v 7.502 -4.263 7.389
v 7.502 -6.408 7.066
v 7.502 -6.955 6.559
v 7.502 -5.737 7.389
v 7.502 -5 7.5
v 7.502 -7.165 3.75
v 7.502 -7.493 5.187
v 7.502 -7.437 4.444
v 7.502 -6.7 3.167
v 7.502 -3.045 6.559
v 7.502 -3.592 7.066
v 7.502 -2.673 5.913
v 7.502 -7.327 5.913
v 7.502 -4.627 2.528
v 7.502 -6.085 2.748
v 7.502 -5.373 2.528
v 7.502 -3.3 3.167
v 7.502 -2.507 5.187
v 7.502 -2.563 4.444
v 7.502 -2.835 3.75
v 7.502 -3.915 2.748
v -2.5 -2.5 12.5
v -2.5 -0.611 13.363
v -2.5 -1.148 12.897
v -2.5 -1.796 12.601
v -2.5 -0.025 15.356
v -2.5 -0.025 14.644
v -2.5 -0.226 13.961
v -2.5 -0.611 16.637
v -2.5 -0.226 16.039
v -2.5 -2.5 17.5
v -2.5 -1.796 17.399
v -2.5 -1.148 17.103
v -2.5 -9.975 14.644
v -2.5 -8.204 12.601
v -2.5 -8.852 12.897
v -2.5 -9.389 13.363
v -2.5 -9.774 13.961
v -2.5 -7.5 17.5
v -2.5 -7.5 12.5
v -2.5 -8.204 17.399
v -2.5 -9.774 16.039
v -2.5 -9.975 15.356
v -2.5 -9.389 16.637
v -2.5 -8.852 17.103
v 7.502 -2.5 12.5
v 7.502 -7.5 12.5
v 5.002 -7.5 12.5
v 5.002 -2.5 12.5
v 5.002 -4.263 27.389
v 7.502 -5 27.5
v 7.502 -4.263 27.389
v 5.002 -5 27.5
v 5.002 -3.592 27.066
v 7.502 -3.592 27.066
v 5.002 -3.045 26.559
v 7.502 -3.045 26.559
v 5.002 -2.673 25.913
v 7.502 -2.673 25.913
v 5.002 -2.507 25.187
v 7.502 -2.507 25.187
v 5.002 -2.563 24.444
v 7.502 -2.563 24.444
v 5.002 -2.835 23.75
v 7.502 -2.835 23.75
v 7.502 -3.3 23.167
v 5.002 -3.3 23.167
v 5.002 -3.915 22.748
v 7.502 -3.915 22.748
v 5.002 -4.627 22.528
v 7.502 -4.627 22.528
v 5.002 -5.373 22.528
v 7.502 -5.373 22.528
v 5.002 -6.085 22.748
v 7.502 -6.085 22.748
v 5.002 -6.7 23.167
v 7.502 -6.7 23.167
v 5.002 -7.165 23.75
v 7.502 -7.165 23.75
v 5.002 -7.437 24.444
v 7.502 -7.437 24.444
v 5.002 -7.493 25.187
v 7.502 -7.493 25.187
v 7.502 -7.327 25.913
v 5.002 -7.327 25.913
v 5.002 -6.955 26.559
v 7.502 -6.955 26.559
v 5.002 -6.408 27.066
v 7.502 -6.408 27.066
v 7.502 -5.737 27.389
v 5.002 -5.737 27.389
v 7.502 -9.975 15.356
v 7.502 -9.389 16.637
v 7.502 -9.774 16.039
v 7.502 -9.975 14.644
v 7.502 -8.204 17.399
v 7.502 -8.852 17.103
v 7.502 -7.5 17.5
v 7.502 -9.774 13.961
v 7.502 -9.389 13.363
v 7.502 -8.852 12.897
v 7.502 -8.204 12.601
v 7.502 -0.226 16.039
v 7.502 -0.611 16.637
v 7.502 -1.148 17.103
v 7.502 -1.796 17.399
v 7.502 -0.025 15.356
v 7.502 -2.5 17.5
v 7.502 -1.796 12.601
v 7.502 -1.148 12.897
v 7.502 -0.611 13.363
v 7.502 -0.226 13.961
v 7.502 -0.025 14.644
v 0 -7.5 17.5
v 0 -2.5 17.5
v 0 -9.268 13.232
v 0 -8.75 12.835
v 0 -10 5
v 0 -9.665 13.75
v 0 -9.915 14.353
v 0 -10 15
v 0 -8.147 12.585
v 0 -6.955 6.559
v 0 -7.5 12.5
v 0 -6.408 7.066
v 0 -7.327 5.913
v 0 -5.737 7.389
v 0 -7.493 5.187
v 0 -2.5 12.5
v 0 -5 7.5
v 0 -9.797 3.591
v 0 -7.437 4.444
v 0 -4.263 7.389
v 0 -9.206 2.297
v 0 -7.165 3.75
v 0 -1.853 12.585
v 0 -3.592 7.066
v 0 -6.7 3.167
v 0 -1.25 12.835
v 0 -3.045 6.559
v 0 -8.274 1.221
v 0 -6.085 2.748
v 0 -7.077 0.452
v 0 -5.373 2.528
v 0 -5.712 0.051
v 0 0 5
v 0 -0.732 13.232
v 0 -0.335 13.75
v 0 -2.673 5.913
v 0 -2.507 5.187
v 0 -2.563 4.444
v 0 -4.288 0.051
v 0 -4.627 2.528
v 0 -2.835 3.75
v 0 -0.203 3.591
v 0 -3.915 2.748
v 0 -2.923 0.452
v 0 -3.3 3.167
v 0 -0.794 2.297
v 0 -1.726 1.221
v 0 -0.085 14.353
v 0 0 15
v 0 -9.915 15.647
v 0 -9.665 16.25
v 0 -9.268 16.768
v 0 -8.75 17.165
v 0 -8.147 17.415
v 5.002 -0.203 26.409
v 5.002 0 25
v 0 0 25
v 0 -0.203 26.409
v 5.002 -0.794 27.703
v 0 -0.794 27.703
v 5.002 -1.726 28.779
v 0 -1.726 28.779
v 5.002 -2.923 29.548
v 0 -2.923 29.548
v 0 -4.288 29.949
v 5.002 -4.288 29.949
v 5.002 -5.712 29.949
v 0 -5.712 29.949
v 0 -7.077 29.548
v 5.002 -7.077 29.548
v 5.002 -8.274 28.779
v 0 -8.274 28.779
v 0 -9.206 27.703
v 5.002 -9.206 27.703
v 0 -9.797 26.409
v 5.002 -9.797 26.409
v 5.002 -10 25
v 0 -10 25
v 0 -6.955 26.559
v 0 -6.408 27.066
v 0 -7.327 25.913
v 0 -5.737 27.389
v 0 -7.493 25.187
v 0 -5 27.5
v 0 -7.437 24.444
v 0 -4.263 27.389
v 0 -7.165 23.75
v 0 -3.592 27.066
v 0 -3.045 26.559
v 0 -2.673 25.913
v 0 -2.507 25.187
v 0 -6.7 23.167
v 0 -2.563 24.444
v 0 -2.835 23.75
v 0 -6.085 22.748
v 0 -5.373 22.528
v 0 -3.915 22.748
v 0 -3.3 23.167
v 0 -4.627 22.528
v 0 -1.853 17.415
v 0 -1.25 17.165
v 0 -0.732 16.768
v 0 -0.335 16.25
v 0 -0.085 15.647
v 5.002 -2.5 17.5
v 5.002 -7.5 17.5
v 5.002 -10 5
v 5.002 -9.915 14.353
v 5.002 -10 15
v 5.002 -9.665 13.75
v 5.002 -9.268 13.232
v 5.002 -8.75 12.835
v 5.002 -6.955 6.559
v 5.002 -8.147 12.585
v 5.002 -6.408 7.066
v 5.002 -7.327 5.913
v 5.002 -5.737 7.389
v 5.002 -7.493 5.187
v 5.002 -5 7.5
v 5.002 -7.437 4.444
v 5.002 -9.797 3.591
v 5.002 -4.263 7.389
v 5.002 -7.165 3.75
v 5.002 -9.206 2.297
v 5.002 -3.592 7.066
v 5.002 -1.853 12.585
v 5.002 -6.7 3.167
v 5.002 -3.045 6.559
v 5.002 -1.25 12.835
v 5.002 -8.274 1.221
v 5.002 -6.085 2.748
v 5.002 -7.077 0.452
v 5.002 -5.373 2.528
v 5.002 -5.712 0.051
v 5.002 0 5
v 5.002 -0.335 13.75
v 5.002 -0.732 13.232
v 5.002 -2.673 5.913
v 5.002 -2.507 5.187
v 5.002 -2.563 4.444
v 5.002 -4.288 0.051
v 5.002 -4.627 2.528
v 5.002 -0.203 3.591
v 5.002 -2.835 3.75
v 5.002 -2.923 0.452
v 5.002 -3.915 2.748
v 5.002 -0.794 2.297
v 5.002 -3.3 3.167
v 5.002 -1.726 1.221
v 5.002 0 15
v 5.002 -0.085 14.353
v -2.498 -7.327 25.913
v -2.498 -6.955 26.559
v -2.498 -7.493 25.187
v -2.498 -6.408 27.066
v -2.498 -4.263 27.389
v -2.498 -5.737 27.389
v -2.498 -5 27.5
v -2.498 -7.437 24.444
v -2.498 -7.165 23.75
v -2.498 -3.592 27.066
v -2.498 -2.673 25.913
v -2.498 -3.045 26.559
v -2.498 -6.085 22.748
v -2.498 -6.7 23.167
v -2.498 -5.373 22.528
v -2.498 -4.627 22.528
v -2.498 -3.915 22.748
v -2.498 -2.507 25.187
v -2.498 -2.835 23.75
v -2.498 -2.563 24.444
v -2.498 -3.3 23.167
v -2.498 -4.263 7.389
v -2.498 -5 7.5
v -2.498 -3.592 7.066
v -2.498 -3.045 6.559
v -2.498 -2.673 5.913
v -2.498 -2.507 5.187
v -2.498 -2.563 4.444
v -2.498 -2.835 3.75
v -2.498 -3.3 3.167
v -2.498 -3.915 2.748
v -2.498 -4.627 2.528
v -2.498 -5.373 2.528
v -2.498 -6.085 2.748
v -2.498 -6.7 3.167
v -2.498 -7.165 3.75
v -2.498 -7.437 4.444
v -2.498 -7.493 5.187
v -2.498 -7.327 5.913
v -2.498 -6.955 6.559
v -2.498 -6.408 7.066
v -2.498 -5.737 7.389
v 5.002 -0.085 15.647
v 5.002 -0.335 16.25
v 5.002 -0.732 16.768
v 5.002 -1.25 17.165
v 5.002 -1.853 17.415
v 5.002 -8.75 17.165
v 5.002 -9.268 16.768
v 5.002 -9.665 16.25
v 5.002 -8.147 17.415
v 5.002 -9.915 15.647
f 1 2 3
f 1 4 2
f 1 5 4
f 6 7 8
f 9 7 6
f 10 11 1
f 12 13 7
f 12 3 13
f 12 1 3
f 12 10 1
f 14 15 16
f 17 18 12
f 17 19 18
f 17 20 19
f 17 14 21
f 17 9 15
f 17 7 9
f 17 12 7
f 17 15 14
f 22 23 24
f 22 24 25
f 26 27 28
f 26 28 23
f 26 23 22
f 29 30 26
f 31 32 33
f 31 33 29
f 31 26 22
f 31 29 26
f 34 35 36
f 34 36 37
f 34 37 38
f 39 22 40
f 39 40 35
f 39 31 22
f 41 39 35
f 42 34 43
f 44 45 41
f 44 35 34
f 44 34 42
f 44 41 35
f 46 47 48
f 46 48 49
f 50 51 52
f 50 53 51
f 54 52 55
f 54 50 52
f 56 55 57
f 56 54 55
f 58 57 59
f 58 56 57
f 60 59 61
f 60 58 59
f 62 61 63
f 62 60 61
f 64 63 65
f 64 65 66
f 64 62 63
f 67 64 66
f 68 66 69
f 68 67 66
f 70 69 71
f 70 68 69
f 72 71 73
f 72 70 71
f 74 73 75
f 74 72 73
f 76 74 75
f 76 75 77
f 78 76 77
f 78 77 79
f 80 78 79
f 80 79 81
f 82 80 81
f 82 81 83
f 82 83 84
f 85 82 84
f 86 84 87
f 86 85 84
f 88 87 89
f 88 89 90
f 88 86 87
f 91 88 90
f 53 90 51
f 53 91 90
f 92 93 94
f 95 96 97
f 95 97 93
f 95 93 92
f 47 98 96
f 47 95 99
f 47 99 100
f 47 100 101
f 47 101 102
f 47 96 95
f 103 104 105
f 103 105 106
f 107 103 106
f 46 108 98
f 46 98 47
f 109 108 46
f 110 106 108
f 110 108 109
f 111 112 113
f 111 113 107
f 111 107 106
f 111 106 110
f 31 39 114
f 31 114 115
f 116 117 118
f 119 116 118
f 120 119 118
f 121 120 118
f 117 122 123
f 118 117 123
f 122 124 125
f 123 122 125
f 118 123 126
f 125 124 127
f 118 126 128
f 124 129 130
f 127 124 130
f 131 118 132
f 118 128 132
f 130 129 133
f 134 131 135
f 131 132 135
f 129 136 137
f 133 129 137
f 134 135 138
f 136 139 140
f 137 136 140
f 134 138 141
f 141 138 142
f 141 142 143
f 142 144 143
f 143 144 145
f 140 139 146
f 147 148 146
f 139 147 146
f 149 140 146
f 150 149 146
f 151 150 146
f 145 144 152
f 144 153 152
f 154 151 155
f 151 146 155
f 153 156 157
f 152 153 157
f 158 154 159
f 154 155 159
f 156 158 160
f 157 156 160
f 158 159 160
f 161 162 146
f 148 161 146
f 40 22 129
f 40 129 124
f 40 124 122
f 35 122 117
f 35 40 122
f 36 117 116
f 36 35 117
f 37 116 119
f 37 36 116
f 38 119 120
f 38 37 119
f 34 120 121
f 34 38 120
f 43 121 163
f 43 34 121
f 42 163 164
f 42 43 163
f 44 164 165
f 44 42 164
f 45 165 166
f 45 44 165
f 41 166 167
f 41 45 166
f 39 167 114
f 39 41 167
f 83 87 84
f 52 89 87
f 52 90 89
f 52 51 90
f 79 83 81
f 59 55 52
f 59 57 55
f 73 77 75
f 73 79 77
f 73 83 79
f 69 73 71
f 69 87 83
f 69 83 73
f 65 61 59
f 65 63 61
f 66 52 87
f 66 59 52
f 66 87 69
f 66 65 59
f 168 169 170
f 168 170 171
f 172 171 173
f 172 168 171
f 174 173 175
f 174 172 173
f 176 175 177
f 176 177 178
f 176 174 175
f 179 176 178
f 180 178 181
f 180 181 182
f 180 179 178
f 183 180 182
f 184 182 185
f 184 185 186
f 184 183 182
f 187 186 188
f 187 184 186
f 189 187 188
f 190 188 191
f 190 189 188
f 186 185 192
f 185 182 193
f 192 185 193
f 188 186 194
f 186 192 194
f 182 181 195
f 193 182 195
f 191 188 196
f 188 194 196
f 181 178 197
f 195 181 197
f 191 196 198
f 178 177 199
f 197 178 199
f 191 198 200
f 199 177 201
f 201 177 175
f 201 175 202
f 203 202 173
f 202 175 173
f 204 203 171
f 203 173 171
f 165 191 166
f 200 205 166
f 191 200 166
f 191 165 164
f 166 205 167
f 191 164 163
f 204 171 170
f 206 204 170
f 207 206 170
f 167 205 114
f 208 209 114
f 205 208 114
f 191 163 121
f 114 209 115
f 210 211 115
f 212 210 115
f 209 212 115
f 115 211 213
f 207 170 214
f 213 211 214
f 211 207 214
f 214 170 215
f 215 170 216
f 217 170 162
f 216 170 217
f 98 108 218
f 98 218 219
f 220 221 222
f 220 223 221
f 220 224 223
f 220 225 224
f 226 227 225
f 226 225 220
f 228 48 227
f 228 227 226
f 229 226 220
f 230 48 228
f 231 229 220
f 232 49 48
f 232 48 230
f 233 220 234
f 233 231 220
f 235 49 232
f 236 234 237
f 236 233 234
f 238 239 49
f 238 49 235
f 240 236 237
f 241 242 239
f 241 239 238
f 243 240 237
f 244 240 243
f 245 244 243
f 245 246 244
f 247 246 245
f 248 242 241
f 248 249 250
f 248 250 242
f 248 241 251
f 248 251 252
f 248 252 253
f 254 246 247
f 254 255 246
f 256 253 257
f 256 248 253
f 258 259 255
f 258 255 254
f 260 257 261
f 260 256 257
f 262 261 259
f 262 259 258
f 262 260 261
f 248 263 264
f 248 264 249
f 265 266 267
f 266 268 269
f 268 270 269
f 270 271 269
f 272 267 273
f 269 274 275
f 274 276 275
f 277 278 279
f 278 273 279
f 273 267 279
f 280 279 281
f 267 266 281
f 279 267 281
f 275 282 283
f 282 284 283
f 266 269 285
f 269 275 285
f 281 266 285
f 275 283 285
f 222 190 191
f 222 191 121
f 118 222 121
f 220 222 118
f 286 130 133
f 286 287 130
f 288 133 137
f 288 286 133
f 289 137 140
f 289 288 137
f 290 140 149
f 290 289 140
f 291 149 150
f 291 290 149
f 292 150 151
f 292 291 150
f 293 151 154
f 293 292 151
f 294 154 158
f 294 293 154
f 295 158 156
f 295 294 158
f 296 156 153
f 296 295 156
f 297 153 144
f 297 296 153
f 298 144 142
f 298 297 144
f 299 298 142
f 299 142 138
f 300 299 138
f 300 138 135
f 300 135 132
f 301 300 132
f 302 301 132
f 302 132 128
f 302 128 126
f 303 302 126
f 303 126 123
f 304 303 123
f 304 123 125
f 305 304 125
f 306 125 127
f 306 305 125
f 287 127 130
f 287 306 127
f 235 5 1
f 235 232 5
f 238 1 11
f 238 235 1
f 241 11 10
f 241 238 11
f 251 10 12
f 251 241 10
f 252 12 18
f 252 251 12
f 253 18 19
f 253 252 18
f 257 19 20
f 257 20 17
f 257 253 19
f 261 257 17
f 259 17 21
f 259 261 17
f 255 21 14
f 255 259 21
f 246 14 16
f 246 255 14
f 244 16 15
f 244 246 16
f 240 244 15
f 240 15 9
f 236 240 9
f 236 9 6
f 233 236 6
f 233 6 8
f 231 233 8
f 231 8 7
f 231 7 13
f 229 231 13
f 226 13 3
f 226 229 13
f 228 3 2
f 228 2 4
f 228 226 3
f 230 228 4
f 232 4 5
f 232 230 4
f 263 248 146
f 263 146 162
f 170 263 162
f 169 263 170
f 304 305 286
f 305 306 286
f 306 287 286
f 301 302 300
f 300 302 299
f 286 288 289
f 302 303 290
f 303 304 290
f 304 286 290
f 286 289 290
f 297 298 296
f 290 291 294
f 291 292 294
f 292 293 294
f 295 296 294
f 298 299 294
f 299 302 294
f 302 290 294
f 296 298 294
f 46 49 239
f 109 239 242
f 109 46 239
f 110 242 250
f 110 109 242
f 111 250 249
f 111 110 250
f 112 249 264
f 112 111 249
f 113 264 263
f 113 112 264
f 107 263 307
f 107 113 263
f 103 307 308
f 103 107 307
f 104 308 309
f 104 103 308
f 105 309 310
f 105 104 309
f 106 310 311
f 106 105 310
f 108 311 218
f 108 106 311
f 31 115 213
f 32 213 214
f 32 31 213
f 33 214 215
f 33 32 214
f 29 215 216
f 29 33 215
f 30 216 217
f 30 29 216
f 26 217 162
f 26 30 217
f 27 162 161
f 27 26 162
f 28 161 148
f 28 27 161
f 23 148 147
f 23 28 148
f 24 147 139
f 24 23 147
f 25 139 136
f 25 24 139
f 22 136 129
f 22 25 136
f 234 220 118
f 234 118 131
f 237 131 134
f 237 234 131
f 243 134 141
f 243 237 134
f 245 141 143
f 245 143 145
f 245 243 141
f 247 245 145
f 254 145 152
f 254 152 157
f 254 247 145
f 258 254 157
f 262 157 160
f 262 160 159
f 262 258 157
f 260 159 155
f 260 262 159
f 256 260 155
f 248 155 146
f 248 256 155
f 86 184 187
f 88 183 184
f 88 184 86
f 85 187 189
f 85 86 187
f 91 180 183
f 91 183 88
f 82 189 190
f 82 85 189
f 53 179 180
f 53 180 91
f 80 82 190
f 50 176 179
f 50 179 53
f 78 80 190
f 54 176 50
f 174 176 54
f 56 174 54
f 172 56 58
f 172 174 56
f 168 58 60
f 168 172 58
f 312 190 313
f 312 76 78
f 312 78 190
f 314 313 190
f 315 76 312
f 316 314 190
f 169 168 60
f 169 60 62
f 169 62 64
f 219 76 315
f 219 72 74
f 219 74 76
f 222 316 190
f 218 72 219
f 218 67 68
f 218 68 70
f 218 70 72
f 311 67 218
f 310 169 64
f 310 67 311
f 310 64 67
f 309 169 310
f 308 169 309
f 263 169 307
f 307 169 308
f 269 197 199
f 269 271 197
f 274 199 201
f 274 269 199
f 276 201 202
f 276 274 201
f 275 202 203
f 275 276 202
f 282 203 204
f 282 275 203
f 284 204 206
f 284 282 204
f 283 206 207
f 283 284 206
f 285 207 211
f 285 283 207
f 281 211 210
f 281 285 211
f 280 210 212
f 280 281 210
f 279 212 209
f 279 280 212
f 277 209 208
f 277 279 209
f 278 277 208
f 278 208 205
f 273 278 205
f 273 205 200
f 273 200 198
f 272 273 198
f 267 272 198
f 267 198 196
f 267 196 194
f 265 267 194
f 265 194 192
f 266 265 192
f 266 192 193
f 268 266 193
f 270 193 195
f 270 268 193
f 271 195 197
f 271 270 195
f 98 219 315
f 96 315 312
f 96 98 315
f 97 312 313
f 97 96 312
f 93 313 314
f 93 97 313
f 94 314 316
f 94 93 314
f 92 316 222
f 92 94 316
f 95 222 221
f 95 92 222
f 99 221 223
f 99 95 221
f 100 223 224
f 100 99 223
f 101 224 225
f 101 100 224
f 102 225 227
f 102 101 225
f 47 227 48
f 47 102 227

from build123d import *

# Parameters (mm, degrees)
BOSS_EXTRUDE1_DEPTH = 5.002296298
BOSS_EXTRUDE2_REACH = 34.501
BOSS_EXTRUDE3_REACH = 35.167
SKETCH4_W           = 2.497703702
SKETCH4_H           = 2.5
SKETCH5_W           = 2.5
SKETCH5_H           = 2.5
SKETCH6_W           = 2.5
SKETCH6_H           = 2.5
SKETCH7_W           = 2.497703702
SKETCH7_H           = 2.5


with BuildPart() as part:
    # Sketch1 → Boss-Extrude1 (new body)
    with BuildSketch(Plane(origin=(5.002296298, 0, 0), x_dir=(0, 0, -1), z_dir=(1, 0, 0))):
        with BuildLine():
            Line((-5, 0), (-25, 0))
            ThreePointArc((-25, 0), (-30, -5), (-25, -10))
            Line((-25, -10), (-5, -10))
            ThreePointArc((-5, -10), (0, -5), (-5, 0))
        make_face()
    extrude(amount=-BOSS_EXTRUDE1_DEPTH)

    # Sketch2 → Boss-Extrude2 (add, up to next)
    with BuildSketch(Plane(origin=(7.502296298, 0, 0), x_dir=(0, 0, -1), z_dir=(1, 0, 0)), mode=Mode.PRIVATE) as boss_extrude2_sk1:
        with BuildLine():
            Line((-17.5, -2.5), (-17.5, -7.5))
            ThreePointArc((-17.5, -7.5), (-15, -10), (-12.5, -7.5))
            Line((-12.5, -7.5), (-12.5, -2.5))
            ThreePointArc((-12.5, -2.5), (-15, 0), (-17.5, -2.5))
        make_face()
    boss_extrude2_tool1 = extrude(boss_extrude2_sk1.sketch, amount=-BOSS_EXTRUDE2_REACH, mode=Mode.PRIVATE) - part.part
    add(boss_extrude2_tool1.solids().sort_by_distance((7.502296, -5, 15))[0])

    # Sketch3 → Boss-Extrude3 (add, up to next)
    with BuildSketch(Plane(origin=(-2.5, 0, 0), x_dir=(0, -1, 0), z_dir=(-1, 0, 0)), mode=Mode.PRIVATE) as boss_extrude3_sk1:
        with BuildLine():
            Line((7.5, 17.5), (2.5, 17.5))
            ThreePointArc((2.5, 17.5), (0, 15), (2.5, 12.5))
            Line((2.5, 12.5), (7.5, 12.5))
            ThreePointArc((7.5, 12.5), (10, 15), (7.5, 17.5))
        make_face()
    boss_extrude3_tool1 = extrude(boss_extrude3_sk1.sketch, amount=-BOSS_EXTRUDE3_REACH, mode=Mode.PRIVATE) - part.part
    add(boss_extrude3_tool1.solids().sort_by_distance((-2.5, -5, 15))[0])

    # Sketch4 → Revolve1 (revolve)
    with BuildSketch(Plane(origin=(0, 0, 5), x_dir=(-1, 0, 0), z_dir=(0, 0, -1)), mode=Mode.PRIVATE) as revolve1_sk:
        with Locations((1.248851851, -3.75)):
            Rectangle(SKETCH4_W, SKETCH4_H)
    revolve(revolve1_sk.sketch.rotate(Axis((0, -5, 5), (-1, 0, 0)), 270), axis=Axis((0, -5, 5), (-1, 0, 0)))

    # Sketch5 → Revolve2 (revolve)
    with BuildSketch(Plane(origin=(0, 0, 5), x_dir=(-1, 0, 0), z_dir=(0, 0, -1)), mode=Mode.PRIVATE) as revolve2_sk:
        with Locations((-6.252296298, -3.75)):
            Rectangle(SKETCH5_W, SKETCH5_H)
    revolve(revolve2_sk.sketch.rotate(Axis((7.502296298, -5, 5), (-1, 0, 0)), 270), axis=Axis((7.502296298, -5, 5), (-1, 0, 0)))

    # Sketch6 → Revolve3 (revolve)
    with BuildSketch(Plane(origin=(0, 0, 25), x_dir=(-1, 0, 0), z_dir=(0, 0, -1)), mode=Mode.PRIVATE) as revolve3_sk:
        with Locations((-6.252296298, -3.75)):
            Rectangle(SKETCH6_W, SKETCH6_H)
    revolve(revolve3_sk.sketch.rotate(Axis((7.502296298, -5, 25), (-1, 0, 0)), 270), axis=Axis((7.502296298, -5, 25), (-1, 0, 0)))

    # Sketch7 → Revolve4 (revolve)
    with BuildSketch(Plane(origin=(0, 0, 25), x_dir=(-1, 0, 0), z_dir=(0, 0, -1)), mode=Mode.PRIVATE) as revolve4_sk:
        with Locations((1.248851851, -3.75)):
            Rectangle(SKETCH7_W, SKETCH7_H)
    revolve(revolve4_sk.sketch.rotate(Axis((0, -5, 25), (-1, 0, 0)), 270), axis=Axis((0, -5, 25), (-1, 0, 0)))


solid = part.part
